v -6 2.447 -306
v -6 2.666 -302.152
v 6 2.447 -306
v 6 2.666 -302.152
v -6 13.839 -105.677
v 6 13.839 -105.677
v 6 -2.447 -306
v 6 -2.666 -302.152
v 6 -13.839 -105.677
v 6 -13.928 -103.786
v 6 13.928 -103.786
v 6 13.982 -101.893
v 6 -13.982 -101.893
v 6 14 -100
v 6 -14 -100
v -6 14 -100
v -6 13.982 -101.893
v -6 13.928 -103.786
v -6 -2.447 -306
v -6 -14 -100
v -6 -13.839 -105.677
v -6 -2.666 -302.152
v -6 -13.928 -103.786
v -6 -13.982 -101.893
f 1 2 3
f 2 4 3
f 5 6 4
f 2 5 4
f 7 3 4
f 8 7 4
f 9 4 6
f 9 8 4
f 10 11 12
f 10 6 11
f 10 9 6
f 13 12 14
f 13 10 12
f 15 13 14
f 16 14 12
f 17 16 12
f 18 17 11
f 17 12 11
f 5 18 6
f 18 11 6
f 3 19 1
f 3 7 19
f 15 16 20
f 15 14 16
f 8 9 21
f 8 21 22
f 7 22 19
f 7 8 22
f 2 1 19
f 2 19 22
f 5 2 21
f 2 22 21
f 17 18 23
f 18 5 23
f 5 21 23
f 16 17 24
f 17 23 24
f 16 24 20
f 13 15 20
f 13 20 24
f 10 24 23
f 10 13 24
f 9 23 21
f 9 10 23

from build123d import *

# Parameters (mm, degrees)
EXTRUDE1_DEPTH = 6


with BuildPart() as part:
    # Sketch1 → Extrude1 (new body, symmetric)
    with BuildSketch(Plane(origin=(0, 0, 0), x_dir=(0, 0, -1), z_dir=(1, 0, 0))):
        with BuildLine():
            Line((105.67734259, 13.838708831), (302.152337132, 2.666129904))
            Line((302.152337132, 2.666129904), (306, 2.447331999))
            Line((306, 2.447331999), (306, 0))
            Line((306, 0), (100, 0))
            Line((100, 0), (100, 14))
            ThreePointArc((100, 14), (102.839816619, 13.959669075), (105.67734259, 13.838708831))
        make_face()
    extrude1 = extrude(amount=EXTRUDE1_DEPTH, both=True)

    # Mirror1: Extrude1 across plane
    add(extrude1.mirror(Plane(origin=(6, 0, -306), x_dir=(0, 0, 1), z_dir=(0, 1, 0))))


solid = part.part
